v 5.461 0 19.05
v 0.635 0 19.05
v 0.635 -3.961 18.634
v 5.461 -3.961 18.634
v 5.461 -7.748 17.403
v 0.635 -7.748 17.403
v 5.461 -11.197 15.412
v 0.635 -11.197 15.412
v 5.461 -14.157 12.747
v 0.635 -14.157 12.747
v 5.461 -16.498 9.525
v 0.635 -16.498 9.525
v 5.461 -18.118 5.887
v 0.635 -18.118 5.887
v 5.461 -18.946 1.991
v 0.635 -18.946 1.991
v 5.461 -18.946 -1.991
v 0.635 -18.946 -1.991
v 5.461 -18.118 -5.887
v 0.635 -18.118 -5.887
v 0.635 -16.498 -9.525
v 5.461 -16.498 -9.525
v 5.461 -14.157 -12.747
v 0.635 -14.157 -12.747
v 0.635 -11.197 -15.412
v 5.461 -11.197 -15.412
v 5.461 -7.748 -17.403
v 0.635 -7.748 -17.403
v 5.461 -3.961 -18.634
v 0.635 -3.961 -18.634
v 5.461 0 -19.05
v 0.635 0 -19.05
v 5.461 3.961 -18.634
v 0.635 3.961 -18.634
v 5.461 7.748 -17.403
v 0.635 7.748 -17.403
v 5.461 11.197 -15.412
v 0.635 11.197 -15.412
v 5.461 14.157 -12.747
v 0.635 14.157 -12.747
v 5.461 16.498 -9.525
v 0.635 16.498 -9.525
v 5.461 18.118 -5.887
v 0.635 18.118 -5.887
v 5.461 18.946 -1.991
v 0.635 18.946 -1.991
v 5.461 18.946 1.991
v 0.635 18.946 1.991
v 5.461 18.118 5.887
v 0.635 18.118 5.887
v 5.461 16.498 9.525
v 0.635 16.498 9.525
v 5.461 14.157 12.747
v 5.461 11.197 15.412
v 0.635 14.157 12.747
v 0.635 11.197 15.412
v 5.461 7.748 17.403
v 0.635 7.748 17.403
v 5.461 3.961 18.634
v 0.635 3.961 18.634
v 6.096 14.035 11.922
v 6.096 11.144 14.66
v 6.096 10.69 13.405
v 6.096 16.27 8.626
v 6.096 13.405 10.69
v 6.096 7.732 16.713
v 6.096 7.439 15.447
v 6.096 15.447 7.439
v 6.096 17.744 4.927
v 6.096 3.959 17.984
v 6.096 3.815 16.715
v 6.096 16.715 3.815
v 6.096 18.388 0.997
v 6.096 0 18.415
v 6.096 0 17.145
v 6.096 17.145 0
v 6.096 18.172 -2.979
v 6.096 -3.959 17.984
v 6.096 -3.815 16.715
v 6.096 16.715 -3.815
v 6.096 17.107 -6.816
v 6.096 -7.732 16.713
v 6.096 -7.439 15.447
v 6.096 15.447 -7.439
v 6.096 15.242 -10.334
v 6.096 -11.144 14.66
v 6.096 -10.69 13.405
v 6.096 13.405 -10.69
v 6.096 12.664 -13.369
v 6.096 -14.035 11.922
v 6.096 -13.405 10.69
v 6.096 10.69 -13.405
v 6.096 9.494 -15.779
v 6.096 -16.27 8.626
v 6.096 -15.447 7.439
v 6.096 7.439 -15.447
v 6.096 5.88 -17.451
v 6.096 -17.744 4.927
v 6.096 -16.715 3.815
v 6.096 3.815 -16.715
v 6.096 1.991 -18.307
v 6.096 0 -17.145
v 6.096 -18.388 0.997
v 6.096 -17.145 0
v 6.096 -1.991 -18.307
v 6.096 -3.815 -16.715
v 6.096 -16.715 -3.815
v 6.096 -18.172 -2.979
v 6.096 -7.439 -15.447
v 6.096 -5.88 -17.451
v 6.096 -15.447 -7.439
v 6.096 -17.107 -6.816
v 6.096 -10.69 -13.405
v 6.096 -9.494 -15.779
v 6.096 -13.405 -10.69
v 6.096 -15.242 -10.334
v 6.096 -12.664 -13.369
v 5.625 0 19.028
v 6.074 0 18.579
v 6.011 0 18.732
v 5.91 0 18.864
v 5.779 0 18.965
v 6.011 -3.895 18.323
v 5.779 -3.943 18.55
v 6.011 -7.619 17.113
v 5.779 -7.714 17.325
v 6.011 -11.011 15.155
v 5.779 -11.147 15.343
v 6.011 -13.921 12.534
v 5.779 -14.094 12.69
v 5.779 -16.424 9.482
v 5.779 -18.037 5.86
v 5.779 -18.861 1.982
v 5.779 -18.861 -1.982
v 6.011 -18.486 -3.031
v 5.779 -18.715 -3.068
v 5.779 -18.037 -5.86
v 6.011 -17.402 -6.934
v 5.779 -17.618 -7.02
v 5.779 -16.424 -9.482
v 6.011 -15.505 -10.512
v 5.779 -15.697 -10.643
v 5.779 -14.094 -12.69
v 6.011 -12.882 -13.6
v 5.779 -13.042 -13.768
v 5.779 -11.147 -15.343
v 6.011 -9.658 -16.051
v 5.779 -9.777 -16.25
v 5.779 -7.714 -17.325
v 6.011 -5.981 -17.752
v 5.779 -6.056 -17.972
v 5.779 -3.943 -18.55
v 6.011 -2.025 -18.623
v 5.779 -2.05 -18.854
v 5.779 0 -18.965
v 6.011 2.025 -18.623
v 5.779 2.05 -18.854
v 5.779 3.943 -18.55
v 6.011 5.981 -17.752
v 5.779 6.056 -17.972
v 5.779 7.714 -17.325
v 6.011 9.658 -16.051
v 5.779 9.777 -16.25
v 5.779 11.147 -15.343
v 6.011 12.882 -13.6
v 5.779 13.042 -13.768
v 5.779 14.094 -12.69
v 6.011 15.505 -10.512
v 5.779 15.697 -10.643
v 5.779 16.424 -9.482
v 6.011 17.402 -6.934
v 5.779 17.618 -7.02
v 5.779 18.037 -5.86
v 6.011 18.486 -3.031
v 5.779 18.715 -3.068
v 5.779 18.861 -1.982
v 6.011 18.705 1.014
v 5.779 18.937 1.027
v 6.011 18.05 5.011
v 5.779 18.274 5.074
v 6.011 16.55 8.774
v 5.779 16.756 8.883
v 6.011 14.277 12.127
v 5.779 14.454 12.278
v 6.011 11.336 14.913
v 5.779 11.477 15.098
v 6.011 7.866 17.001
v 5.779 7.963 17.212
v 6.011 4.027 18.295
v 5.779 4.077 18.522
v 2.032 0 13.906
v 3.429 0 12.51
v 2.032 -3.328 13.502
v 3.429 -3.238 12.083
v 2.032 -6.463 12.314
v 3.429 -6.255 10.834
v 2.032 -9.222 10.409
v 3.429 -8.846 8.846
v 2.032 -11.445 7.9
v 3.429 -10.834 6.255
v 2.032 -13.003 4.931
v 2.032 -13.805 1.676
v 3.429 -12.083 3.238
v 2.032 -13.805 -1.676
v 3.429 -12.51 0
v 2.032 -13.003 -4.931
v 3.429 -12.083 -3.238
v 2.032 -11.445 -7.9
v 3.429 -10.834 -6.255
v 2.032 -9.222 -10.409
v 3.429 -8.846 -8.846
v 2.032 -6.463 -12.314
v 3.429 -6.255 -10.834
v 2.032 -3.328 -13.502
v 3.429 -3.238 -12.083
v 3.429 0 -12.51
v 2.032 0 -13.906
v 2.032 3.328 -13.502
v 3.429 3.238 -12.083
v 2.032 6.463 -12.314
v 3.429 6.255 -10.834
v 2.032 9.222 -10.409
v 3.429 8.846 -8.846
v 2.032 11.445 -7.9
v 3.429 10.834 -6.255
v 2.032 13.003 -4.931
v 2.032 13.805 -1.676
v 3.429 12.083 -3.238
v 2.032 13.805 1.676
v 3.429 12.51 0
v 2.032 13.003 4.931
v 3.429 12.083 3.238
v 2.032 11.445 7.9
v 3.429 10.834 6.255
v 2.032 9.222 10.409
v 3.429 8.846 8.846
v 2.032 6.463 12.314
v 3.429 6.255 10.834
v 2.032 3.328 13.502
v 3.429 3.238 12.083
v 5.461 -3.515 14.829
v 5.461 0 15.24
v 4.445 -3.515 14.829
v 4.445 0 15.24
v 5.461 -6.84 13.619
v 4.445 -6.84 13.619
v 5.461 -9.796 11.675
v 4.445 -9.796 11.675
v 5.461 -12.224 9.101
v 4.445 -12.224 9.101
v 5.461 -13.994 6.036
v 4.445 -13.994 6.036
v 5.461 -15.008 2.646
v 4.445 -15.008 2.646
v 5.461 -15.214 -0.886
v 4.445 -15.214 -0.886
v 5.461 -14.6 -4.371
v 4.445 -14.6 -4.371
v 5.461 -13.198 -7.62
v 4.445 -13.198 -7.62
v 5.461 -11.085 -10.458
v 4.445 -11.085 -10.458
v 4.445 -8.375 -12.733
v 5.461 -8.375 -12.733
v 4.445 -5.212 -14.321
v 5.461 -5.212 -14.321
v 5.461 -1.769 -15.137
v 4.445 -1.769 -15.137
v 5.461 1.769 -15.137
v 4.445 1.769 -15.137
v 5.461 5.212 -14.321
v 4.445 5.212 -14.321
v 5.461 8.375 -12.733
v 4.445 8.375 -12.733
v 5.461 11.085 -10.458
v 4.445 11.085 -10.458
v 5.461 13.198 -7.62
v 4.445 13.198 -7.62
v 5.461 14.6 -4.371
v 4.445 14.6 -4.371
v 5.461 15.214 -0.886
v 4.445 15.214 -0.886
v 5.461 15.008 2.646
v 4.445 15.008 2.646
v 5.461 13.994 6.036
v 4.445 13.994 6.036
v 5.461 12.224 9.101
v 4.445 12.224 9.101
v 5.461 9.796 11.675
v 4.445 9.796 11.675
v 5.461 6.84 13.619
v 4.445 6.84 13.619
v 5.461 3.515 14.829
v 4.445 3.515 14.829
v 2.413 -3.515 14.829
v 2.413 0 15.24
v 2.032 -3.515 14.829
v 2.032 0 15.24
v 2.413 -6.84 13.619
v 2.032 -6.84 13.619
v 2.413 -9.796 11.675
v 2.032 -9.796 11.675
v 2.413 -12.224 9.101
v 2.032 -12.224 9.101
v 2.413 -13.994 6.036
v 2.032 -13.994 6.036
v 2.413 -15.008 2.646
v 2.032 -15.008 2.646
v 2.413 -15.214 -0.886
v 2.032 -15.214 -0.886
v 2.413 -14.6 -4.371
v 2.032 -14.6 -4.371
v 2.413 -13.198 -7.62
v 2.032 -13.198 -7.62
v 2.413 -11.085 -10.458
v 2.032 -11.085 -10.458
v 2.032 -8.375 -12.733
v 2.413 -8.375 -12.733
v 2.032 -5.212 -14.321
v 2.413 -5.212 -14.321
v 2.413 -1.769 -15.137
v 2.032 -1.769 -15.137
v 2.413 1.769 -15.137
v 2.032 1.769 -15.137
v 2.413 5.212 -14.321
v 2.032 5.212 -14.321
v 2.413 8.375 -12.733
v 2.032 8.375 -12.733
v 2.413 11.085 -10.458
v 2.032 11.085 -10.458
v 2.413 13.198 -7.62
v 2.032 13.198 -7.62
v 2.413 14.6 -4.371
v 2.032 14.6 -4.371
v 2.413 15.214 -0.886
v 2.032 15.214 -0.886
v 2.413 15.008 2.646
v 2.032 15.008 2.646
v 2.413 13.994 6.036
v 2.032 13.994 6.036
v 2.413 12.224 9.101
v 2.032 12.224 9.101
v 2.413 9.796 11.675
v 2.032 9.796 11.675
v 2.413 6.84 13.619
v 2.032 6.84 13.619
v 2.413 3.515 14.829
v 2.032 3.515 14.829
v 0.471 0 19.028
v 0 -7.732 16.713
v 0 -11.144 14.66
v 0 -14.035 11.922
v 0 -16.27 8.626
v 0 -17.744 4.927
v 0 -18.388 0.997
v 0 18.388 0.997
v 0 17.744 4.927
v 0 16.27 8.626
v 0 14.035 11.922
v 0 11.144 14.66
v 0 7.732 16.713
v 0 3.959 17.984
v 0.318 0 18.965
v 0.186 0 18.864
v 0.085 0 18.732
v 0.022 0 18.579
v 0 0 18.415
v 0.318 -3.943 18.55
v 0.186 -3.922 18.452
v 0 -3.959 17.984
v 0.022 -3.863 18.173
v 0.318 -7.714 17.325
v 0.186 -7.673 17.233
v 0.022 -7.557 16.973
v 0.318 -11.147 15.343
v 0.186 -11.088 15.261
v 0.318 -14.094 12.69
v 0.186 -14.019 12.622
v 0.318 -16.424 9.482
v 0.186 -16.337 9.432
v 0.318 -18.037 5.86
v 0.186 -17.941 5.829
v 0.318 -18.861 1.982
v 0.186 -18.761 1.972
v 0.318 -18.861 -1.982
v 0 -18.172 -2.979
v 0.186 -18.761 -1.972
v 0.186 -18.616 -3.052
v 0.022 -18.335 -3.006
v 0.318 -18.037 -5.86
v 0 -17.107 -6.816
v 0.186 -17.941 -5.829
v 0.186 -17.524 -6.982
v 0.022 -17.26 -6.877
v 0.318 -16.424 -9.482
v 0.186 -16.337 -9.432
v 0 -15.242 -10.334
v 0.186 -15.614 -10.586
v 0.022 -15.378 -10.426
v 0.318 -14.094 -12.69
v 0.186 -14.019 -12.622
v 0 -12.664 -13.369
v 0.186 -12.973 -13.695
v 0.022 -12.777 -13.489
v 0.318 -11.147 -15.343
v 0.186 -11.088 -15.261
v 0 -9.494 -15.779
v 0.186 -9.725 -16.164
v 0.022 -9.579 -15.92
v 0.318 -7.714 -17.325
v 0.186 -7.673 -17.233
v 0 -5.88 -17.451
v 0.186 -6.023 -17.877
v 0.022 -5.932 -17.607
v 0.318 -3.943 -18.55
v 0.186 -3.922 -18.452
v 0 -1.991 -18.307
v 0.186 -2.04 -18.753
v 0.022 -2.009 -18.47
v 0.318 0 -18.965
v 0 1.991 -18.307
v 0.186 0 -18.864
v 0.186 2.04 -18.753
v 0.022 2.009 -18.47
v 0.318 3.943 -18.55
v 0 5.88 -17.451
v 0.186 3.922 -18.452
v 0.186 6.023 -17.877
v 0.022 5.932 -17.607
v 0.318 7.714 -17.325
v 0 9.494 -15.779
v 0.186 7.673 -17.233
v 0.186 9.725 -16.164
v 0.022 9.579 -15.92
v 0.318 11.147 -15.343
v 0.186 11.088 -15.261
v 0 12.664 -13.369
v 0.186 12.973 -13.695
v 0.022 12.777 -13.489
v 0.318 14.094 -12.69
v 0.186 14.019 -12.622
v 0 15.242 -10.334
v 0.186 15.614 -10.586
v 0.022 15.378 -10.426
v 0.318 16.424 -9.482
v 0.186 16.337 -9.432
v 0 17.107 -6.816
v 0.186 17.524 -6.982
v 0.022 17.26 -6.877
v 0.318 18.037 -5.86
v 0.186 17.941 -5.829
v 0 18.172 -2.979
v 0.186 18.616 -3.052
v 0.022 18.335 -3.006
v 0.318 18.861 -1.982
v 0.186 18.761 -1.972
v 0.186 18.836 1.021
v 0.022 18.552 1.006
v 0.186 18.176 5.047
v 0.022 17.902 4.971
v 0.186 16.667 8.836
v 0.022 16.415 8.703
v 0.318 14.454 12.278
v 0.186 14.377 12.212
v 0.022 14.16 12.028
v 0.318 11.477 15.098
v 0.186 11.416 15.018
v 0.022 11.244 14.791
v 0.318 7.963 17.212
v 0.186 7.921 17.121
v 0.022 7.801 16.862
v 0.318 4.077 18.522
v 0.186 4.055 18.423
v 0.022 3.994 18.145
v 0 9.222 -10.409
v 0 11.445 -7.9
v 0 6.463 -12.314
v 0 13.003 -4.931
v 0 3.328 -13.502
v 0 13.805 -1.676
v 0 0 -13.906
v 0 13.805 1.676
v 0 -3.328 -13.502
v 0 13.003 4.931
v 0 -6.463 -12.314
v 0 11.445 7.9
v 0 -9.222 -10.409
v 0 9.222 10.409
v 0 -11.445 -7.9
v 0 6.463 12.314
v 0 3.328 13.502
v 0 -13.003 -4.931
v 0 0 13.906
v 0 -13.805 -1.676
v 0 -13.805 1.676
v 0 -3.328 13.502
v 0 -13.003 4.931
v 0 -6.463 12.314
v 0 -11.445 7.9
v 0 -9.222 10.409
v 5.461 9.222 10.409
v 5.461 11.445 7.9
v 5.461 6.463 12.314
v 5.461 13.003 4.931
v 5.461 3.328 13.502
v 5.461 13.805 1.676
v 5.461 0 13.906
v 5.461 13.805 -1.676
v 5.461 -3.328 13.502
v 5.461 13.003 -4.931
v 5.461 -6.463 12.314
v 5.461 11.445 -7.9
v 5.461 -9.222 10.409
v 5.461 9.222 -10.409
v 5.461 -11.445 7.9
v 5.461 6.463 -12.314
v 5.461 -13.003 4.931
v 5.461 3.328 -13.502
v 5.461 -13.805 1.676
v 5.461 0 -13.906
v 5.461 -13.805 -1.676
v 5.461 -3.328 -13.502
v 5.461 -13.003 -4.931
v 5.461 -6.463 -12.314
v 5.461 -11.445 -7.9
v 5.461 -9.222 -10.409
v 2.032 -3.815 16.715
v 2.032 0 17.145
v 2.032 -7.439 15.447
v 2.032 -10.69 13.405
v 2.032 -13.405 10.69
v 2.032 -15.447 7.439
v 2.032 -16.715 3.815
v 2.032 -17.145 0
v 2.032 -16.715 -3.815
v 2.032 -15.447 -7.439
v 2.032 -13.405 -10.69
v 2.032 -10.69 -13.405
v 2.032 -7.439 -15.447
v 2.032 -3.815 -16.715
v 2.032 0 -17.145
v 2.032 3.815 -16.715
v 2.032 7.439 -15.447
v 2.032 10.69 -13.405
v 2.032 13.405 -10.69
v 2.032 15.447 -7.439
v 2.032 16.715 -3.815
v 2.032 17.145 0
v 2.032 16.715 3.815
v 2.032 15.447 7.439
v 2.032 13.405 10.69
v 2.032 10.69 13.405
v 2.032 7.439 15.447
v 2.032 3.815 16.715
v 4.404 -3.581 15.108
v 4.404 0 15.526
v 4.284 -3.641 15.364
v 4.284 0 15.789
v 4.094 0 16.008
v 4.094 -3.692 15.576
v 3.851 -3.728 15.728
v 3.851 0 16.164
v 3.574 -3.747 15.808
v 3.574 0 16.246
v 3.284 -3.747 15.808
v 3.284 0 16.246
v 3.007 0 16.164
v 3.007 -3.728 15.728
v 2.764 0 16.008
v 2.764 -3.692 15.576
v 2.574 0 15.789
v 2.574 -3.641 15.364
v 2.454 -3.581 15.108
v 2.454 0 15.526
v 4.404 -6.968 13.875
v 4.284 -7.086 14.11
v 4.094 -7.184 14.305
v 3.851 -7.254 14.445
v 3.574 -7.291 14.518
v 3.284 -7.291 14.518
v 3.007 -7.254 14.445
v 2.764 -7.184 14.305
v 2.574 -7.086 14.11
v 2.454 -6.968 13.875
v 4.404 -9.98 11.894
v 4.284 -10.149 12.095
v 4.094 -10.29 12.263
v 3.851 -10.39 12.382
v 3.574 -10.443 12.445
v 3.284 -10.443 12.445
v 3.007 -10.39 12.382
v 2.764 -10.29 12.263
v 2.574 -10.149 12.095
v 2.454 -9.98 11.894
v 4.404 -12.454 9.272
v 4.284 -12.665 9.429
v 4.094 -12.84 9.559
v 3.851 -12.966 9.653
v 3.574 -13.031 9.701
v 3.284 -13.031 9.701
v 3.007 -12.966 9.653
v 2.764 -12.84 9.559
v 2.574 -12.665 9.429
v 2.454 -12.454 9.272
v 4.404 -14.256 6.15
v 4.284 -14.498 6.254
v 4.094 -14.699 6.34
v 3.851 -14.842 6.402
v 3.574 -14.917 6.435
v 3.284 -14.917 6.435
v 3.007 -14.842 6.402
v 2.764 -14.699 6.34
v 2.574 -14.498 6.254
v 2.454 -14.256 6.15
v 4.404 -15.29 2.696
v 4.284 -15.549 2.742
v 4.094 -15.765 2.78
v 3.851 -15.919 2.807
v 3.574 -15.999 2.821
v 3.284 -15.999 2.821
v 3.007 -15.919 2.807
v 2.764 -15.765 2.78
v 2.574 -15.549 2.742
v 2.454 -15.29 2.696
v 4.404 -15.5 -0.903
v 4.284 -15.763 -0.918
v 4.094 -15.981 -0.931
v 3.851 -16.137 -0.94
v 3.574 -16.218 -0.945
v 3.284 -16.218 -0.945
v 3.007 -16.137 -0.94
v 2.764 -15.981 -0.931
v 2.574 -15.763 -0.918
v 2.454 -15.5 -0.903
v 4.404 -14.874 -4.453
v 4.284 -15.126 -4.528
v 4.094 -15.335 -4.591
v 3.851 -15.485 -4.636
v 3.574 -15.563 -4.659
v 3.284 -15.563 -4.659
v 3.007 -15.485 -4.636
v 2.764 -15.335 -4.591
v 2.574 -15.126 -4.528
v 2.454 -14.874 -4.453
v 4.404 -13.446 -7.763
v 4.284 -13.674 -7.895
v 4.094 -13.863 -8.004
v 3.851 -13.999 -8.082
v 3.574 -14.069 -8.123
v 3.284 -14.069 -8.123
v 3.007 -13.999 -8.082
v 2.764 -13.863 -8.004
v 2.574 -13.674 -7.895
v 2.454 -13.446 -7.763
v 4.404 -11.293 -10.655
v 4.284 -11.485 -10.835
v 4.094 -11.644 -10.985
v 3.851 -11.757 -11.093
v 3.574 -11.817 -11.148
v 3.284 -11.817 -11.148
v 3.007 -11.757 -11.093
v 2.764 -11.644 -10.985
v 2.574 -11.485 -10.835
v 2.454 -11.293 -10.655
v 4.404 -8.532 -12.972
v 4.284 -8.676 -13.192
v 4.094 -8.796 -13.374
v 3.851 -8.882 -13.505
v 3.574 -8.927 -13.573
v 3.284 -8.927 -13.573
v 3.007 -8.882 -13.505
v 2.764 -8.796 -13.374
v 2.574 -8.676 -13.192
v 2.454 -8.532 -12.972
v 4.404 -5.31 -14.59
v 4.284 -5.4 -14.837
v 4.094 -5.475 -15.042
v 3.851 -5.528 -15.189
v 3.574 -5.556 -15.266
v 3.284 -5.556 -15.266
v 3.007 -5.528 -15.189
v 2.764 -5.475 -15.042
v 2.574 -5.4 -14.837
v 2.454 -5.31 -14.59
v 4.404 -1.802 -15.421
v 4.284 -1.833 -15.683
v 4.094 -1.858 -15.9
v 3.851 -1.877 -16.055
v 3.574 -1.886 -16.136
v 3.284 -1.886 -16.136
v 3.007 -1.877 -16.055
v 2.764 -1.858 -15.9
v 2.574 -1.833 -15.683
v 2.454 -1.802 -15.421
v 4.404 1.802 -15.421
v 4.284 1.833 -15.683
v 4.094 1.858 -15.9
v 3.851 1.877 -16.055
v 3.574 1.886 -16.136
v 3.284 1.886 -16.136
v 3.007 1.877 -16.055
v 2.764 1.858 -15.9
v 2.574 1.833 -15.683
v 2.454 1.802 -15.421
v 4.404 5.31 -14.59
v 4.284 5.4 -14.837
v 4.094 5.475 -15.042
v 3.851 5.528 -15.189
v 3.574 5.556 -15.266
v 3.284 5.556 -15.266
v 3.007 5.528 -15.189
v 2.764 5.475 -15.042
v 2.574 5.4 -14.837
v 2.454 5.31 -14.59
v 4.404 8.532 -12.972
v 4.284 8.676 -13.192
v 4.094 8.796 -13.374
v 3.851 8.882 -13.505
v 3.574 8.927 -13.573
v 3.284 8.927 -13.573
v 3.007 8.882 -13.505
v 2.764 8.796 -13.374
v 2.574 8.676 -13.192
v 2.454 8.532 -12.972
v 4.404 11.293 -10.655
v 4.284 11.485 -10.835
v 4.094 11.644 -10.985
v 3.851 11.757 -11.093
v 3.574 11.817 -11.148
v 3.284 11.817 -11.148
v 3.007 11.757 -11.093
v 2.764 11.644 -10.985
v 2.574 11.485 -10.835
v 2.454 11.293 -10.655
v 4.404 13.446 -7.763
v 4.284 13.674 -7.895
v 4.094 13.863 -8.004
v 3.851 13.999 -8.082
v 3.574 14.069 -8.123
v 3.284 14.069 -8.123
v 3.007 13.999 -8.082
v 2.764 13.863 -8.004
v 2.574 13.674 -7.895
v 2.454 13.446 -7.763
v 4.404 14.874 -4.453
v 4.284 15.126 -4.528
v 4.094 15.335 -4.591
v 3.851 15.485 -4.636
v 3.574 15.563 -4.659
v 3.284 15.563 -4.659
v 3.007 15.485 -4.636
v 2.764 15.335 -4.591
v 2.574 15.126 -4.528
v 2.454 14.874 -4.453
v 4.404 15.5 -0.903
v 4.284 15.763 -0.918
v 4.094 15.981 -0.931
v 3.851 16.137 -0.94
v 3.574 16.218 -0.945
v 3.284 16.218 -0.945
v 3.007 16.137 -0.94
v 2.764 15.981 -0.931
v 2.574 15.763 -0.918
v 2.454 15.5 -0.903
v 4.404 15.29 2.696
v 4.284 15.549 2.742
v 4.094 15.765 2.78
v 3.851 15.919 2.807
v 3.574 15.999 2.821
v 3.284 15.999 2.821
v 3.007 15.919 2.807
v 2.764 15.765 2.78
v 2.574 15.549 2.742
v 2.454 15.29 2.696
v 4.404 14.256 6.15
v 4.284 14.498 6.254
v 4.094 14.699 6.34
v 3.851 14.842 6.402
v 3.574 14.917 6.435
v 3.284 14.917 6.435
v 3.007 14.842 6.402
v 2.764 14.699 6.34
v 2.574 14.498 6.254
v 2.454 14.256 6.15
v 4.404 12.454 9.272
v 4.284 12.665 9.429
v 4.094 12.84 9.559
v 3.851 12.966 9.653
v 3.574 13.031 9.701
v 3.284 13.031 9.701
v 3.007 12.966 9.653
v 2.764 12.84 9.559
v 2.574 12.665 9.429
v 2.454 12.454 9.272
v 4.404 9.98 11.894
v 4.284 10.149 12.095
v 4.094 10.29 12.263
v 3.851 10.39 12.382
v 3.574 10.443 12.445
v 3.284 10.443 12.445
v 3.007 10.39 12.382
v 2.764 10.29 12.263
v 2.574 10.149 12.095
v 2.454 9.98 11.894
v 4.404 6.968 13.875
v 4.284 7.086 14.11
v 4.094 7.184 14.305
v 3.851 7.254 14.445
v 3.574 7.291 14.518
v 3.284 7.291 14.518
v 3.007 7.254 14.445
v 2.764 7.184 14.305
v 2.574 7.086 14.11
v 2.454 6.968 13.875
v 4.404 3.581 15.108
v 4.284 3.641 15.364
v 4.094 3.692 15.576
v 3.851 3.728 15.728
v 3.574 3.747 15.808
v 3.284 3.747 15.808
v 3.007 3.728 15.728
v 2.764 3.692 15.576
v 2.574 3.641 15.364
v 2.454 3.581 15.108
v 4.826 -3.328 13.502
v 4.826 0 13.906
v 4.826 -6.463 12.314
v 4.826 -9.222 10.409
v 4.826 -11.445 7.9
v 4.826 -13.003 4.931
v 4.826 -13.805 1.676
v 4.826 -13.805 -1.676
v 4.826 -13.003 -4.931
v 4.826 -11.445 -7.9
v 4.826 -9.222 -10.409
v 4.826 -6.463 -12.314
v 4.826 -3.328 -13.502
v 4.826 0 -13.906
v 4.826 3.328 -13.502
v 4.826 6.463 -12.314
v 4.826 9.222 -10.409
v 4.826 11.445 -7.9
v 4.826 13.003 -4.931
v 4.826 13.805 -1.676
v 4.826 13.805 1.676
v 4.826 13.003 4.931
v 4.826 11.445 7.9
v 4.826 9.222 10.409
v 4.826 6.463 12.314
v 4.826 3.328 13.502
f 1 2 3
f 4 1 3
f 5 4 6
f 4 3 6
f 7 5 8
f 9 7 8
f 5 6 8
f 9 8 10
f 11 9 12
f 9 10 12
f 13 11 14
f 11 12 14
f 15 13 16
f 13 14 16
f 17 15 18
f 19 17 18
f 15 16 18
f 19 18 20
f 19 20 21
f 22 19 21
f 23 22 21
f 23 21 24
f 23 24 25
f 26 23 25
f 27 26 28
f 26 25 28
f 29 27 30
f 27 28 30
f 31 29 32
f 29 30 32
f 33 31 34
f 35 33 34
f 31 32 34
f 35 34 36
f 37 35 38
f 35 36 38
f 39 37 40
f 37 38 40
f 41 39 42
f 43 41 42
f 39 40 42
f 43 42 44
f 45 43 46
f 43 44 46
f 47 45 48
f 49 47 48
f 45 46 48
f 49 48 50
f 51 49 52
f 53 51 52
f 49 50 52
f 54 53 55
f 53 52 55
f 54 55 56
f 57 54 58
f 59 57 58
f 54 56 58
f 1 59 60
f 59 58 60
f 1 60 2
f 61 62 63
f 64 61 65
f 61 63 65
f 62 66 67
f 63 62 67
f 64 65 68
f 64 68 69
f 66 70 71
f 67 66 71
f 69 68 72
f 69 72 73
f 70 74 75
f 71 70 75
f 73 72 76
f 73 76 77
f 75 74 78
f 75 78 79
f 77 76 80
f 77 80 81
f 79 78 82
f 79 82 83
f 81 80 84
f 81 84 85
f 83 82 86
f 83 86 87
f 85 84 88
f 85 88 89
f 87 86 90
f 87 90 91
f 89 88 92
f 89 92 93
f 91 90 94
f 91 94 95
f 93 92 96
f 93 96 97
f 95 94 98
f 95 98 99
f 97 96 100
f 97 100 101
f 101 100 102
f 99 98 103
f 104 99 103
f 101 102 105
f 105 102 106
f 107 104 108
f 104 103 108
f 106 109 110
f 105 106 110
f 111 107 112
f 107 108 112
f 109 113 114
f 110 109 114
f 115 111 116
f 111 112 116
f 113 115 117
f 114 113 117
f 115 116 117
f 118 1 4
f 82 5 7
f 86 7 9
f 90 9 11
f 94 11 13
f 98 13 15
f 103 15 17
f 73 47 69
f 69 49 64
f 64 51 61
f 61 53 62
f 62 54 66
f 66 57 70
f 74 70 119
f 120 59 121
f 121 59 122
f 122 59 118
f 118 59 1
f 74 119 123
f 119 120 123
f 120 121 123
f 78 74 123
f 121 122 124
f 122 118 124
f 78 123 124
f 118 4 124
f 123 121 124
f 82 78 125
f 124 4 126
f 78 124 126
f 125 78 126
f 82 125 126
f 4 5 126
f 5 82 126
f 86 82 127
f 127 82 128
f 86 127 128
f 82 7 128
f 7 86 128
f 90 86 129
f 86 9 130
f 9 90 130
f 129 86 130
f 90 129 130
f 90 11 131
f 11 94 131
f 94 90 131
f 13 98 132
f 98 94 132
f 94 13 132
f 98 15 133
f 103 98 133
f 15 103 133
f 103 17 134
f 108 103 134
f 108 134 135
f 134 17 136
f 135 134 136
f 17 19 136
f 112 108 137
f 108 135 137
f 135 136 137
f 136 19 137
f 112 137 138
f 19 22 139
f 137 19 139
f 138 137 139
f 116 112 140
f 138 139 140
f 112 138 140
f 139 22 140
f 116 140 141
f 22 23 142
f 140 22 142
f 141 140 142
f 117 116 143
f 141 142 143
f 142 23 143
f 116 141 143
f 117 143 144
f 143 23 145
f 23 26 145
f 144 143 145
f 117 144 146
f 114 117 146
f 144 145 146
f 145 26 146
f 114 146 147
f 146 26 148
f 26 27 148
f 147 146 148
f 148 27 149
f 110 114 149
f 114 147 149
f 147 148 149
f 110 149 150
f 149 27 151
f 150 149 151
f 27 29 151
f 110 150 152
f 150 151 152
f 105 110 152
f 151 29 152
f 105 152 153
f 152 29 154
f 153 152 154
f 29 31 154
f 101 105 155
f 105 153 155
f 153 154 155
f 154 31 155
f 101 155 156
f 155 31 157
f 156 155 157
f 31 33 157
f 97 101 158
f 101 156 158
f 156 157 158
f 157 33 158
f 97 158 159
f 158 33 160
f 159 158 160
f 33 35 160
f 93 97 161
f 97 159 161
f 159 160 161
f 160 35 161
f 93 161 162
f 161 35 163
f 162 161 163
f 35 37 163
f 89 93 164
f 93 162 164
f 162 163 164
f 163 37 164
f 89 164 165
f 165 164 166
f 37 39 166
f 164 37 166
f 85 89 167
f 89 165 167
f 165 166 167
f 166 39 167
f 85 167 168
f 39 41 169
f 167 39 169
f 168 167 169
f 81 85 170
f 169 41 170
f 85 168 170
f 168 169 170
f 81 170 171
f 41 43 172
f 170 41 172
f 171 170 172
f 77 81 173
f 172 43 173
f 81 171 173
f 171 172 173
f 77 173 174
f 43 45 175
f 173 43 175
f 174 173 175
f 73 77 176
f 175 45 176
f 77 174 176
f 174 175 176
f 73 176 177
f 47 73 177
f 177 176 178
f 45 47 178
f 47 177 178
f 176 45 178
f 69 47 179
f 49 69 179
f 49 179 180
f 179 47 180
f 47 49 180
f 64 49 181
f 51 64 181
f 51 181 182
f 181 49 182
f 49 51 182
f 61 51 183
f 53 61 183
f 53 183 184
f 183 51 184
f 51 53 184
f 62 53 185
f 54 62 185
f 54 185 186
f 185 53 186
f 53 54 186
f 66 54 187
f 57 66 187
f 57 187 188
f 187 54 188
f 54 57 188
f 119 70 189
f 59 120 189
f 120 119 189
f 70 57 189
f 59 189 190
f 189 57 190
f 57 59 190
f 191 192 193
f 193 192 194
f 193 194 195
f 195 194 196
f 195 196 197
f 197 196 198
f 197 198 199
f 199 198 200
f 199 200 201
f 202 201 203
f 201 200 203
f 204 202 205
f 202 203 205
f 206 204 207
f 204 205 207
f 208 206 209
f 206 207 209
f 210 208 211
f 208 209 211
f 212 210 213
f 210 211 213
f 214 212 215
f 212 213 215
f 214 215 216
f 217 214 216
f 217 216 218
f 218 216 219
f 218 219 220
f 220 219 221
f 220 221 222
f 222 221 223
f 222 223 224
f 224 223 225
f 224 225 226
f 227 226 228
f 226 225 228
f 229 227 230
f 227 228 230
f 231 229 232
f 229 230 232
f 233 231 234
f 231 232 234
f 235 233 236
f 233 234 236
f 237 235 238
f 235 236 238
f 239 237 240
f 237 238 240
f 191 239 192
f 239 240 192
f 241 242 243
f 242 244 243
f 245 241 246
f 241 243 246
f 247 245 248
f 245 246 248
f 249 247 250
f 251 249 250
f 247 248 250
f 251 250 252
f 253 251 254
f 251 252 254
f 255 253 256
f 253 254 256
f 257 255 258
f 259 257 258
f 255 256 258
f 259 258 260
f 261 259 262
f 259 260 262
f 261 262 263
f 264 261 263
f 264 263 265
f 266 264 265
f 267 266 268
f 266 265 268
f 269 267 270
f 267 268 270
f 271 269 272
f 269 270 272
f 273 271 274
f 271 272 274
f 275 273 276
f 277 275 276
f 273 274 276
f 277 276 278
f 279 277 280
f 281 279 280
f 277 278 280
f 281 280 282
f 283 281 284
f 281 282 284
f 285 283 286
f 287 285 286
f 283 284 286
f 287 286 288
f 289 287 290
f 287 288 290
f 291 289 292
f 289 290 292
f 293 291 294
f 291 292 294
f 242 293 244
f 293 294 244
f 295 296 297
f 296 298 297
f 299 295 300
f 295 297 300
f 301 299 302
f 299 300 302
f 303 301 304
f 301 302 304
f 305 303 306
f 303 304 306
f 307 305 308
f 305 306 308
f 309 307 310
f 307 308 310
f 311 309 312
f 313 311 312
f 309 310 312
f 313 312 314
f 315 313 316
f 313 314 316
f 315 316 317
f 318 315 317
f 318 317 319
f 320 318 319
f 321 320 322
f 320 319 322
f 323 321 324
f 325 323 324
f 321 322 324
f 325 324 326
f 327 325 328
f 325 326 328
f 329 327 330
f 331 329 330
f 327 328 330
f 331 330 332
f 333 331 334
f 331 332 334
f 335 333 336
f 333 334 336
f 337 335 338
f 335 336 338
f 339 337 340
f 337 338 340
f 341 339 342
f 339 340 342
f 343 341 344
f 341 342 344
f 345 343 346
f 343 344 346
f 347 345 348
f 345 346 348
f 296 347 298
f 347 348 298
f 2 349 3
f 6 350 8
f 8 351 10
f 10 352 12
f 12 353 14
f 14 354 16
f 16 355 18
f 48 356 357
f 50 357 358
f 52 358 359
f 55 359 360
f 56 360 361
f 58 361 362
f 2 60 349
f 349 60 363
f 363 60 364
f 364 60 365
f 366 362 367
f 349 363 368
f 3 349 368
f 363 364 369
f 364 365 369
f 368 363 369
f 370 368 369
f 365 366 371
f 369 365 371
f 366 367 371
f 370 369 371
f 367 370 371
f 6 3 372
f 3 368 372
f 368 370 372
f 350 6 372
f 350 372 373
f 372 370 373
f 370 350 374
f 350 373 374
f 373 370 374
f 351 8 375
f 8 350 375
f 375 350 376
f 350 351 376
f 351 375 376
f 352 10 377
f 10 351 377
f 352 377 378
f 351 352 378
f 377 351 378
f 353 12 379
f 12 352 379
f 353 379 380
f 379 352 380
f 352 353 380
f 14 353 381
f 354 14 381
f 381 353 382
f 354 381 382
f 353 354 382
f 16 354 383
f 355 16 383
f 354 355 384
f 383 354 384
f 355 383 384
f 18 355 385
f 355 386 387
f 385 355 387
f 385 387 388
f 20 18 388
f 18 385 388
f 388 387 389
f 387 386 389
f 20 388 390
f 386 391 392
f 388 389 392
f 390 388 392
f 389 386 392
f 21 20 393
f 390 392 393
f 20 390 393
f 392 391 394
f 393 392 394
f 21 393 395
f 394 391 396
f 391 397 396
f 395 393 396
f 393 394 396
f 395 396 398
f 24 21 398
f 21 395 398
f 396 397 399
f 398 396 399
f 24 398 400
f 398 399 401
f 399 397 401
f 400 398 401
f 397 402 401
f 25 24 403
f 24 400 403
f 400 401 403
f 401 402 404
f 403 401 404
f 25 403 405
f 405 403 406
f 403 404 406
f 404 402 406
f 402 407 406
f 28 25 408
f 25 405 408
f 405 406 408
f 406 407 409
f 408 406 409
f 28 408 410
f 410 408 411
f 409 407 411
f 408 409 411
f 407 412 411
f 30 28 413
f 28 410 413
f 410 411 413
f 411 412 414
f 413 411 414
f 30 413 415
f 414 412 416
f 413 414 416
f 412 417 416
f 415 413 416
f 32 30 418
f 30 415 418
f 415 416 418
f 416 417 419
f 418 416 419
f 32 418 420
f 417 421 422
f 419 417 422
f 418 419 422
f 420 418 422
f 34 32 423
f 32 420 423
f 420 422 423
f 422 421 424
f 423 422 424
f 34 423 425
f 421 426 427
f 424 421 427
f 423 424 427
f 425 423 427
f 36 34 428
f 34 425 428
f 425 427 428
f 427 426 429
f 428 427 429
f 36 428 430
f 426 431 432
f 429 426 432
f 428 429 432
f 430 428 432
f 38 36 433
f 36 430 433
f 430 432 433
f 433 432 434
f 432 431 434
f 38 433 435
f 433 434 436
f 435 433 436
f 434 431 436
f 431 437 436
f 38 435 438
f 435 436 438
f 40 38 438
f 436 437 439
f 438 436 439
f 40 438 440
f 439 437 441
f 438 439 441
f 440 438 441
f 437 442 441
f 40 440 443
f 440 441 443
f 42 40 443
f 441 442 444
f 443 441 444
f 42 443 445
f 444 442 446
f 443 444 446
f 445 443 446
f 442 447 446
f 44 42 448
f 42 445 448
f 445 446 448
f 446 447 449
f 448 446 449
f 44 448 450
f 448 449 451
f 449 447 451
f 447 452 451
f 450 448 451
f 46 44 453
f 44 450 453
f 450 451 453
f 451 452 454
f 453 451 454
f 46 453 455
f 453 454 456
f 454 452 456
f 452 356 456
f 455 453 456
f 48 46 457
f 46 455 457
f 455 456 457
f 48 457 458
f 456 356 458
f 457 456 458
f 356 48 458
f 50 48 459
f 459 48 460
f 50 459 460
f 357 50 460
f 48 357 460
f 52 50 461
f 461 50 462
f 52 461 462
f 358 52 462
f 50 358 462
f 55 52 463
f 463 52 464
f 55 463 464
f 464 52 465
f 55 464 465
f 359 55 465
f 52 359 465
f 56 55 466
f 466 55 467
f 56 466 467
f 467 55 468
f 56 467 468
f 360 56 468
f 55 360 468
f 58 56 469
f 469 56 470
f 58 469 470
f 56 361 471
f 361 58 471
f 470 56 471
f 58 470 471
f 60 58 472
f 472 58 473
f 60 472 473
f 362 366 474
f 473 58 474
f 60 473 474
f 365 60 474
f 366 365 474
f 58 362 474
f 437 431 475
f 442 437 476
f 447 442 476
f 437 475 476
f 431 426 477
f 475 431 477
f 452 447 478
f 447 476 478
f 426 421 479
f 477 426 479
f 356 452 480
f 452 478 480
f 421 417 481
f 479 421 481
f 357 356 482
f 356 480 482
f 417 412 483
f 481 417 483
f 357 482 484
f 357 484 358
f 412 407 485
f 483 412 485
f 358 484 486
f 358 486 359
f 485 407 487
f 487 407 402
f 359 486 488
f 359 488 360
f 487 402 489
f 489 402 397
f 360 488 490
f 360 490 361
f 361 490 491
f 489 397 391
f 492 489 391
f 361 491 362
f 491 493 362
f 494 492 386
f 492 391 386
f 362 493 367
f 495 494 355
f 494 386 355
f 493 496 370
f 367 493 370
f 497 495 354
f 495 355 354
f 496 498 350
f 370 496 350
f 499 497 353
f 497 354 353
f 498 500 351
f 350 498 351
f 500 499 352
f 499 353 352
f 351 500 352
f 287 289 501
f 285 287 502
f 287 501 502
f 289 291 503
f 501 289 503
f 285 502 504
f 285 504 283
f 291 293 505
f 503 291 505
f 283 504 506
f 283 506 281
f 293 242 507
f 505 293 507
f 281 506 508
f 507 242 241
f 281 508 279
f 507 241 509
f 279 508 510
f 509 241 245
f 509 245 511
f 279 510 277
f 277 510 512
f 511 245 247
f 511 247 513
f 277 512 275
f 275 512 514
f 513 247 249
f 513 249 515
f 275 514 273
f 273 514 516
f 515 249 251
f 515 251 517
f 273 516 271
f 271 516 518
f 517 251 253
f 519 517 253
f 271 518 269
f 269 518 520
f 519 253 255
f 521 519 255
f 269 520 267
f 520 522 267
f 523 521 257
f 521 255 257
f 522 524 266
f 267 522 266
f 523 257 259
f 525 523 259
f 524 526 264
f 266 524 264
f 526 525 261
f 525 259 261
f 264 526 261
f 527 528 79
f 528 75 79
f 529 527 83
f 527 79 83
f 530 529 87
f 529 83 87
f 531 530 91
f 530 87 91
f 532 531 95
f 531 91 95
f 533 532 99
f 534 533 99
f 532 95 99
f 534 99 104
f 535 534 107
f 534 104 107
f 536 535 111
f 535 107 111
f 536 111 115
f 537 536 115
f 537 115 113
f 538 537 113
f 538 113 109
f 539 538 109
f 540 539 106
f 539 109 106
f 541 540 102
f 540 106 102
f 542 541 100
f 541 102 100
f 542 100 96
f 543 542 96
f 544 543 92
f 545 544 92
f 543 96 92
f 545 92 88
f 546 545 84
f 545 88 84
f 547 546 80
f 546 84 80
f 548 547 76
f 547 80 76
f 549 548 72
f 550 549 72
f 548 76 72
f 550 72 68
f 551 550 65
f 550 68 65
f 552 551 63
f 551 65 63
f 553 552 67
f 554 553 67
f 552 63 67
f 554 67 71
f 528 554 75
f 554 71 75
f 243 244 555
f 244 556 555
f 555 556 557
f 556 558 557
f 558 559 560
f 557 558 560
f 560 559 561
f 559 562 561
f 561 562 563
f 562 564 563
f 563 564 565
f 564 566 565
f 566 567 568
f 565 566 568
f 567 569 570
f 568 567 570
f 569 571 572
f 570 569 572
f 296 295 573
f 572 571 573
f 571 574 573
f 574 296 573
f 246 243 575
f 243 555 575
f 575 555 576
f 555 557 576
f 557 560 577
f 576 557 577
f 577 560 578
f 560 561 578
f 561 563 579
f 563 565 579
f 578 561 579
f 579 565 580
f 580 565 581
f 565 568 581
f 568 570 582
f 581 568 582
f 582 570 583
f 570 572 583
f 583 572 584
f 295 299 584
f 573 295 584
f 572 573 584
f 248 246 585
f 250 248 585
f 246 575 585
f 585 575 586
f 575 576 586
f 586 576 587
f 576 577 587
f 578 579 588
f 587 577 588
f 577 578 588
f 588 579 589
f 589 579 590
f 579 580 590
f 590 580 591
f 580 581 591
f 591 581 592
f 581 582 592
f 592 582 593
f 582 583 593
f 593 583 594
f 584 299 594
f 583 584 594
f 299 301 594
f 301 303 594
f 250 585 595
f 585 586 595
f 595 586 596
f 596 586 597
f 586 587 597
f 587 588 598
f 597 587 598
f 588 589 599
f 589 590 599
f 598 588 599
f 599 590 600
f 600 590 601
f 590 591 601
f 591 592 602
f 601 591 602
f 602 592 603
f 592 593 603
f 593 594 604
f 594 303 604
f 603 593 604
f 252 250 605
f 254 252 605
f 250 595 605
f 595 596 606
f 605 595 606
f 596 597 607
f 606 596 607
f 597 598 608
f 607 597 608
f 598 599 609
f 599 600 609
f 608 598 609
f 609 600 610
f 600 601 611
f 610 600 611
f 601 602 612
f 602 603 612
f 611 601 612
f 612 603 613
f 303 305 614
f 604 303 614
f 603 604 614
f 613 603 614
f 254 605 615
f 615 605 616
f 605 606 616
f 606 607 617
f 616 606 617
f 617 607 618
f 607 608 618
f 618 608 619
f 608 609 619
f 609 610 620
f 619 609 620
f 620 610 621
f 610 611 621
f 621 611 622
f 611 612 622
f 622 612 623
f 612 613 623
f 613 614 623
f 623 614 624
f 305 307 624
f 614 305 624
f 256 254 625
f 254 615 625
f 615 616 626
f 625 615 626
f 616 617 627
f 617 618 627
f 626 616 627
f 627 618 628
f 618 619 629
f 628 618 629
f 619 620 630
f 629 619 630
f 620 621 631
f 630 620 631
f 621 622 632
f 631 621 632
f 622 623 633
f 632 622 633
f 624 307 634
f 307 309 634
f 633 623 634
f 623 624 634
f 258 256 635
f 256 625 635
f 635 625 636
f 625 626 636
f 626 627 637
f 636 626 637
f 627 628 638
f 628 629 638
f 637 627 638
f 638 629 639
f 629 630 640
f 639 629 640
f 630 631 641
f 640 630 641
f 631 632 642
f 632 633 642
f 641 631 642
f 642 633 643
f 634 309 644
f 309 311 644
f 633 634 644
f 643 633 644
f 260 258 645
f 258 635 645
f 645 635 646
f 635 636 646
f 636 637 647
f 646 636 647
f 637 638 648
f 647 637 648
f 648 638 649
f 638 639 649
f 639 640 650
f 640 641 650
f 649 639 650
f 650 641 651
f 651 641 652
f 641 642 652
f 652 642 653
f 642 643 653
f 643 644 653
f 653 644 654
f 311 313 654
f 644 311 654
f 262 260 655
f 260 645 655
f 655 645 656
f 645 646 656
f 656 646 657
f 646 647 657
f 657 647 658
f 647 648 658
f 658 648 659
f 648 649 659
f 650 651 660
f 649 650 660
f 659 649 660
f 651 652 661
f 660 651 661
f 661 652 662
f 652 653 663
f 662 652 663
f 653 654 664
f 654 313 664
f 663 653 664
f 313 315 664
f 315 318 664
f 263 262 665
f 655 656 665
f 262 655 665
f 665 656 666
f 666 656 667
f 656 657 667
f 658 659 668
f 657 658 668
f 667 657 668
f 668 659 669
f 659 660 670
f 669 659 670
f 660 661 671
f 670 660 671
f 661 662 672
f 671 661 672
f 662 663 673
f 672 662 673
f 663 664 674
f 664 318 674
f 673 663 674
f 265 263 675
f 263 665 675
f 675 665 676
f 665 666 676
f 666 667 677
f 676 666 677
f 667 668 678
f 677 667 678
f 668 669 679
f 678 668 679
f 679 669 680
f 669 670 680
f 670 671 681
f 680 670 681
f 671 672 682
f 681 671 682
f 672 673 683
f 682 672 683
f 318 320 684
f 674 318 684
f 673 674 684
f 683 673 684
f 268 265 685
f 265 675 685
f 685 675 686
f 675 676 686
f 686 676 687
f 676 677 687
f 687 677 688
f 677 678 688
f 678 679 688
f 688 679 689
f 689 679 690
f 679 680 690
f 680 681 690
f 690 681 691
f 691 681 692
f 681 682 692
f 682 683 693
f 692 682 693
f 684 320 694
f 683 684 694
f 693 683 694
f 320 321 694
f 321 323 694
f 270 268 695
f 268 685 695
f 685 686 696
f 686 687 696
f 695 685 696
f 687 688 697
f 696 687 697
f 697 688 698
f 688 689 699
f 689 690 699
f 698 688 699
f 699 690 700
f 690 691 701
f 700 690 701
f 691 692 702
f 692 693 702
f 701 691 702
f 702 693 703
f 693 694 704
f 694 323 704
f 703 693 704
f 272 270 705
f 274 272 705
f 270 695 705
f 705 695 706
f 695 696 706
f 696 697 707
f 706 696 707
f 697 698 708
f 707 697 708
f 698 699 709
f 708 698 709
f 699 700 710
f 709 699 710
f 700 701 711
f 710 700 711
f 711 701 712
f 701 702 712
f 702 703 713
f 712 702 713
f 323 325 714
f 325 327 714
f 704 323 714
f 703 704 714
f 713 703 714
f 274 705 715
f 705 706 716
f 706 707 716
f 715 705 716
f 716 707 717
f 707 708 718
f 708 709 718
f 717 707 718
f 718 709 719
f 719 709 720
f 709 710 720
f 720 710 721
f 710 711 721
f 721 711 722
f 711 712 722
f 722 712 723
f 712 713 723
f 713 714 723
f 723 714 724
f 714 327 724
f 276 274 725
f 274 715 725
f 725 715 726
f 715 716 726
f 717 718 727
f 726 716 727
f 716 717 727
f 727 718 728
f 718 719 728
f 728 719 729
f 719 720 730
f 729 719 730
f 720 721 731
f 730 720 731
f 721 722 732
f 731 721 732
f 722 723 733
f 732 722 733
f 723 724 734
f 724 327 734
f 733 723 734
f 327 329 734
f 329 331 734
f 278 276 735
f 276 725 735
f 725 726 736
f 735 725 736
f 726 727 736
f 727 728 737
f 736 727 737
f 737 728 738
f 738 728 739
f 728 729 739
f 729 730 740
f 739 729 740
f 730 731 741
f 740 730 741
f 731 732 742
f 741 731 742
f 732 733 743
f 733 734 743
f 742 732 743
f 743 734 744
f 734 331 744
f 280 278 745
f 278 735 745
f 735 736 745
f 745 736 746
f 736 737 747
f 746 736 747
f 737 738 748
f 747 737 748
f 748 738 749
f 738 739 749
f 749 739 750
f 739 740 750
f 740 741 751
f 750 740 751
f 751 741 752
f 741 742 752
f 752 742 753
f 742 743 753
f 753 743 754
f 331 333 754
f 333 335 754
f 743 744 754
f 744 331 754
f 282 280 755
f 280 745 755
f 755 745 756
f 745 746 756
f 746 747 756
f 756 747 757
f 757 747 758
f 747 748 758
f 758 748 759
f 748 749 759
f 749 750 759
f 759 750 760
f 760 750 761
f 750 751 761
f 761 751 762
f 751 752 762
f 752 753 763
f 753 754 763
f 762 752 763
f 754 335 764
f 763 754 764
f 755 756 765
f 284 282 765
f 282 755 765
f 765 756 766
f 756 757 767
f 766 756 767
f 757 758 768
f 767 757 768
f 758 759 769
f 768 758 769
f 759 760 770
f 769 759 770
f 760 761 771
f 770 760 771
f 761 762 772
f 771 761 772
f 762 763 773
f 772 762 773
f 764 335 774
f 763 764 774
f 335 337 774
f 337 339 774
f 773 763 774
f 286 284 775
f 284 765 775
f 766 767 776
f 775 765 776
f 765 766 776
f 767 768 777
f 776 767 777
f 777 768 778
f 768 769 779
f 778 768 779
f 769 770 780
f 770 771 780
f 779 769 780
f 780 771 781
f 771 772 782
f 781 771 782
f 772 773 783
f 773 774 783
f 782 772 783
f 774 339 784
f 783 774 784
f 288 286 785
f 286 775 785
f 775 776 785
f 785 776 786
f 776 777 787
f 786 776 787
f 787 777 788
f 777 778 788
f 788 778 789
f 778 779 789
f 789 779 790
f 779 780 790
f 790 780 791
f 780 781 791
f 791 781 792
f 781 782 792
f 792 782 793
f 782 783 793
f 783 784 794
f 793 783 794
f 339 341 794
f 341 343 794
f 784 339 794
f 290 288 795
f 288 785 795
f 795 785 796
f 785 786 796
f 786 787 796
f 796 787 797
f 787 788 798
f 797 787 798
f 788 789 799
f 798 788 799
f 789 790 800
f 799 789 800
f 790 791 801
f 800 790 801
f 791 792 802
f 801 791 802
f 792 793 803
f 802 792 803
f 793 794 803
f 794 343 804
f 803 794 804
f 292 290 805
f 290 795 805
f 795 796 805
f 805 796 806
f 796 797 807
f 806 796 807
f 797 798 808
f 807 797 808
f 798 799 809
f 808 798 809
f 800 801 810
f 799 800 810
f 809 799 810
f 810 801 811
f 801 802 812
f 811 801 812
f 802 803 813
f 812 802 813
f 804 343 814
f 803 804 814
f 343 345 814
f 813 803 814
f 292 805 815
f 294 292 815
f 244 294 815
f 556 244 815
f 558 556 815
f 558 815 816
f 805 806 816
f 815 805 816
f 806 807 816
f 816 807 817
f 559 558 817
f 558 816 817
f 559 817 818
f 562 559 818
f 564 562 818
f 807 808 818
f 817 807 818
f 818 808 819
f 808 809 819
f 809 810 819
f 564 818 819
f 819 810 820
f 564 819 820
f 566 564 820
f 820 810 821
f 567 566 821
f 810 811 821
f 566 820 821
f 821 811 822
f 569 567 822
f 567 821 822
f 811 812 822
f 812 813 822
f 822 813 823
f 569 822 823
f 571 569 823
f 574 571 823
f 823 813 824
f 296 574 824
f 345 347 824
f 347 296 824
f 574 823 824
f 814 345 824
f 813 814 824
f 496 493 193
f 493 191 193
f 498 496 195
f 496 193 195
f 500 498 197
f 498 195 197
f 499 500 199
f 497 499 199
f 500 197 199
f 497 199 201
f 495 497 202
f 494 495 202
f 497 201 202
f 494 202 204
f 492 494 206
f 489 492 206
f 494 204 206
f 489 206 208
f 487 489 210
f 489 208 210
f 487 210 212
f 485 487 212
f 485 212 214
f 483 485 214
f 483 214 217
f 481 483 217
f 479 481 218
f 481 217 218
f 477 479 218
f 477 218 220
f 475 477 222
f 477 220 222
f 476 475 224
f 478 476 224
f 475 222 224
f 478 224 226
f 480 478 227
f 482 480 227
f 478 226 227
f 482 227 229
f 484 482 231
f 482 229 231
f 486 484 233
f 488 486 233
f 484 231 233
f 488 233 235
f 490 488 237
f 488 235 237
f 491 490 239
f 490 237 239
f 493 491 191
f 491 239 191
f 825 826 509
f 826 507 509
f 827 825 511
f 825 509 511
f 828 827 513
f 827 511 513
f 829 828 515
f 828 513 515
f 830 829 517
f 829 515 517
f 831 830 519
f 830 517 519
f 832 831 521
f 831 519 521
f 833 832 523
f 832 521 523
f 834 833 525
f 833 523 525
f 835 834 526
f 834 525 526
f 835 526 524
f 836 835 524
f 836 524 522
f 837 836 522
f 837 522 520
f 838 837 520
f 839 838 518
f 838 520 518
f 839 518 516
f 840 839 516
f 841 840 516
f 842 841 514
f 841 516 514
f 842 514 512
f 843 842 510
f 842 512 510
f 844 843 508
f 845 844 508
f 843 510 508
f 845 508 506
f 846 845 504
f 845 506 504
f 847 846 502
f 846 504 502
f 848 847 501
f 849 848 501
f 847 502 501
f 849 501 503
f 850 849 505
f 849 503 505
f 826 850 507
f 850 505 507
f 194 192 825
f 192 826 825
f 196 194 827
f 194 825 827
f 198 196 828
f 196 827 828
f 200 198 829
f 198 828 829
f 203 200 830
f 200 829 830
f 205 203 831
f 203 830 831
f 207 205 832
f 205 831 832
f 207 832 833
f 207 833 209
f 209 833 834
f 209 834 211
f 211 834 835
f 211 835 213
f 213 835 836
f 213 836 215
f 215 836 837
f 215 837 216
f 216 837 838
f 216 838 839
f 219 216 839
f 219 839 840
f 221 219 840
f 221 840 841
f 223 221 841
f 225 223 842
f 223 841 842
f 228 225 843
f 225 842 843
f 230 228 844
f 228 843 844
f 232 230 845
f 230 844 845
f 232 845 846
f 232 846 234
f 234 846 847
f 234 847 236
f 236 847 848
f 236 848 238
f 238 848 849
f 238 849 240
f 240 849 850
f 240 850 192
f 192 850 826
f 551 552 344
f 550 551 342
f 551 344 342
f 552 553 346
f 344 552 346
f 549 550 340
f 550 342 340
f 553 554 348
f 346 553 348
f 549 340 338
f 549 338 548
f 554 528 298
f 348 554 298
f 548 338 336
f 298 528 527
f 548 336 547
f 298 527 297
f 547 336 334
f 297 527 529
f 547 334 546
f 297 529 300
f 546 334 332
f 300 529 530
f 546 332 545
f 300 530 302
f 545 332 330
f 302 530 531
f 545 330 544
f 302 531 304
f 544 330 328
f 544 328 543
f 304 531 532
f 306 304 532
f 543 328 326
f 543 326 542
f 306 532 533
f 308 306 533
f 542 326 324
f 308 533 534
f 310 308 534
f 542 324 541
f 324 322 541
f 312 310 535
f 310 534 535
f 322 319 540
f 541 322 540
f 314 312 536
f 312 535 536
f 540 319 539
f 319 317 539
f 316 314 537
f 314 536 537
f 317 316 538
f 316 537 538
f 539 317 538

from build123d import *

# Parameters (mm, degrees)
EDGE_FILLET_R = 0.635


with BuildPart() as part:
    # Primary Sketch → Primary Revolve (revolve)
    with BuildSketch(Plane.XY, mode=Mode.PRIVATE) as primary_revolve_sk:
        with BuildLine():
            Line((2.032, 17.145), (6.096, 17.145))
            Line((6.096, 17.145), (6.096, 19.05))
            Line((6.096, 19.05), (0, 19.05))
            Line((0, 19.05), (0, 17.145))
            Line((0, 17.145), (0, 13.9065))
            Line((0, 13.9065), (2.032, 13.9065))
            Line((2.032, 13.9065), (3.429, 12.5095))
            Line((3.429, 12.5095), (4.826, 13.9065))
            Line((4.826, 13.9065), (5.461, 13.9065))
            Line((5.461, 13.9065), (5.461, 15.24))
            Line((5.461, 15.24), (4.445, 15.24))
            ThreePointArc((4.445, 15.24), (3.429, 16.256), (2.413, 15.24))
            Line((2.413, 15.24), (2.032, 15.24))
            Line((2.032, 15.24), (2.032, 17.145))
        make_face()
    revolve(primary_revolve_sk.sketch.rotate(Axis((0, 0, 0), (1, 0, 0)), 90), axis=Axis((0, 0, 0), (1, 0, 0)))

    # Edge Fillet
    edge_fillet_edges = [part.edges().sort_by_distance(p)[0] for p in [
        (6.096, 0, -19.05),
        (0, 0, -19.05),
    ]]
    fillet(edge_fillet_edges, radius=EDGE_FILLET_R)


solid = part.part
